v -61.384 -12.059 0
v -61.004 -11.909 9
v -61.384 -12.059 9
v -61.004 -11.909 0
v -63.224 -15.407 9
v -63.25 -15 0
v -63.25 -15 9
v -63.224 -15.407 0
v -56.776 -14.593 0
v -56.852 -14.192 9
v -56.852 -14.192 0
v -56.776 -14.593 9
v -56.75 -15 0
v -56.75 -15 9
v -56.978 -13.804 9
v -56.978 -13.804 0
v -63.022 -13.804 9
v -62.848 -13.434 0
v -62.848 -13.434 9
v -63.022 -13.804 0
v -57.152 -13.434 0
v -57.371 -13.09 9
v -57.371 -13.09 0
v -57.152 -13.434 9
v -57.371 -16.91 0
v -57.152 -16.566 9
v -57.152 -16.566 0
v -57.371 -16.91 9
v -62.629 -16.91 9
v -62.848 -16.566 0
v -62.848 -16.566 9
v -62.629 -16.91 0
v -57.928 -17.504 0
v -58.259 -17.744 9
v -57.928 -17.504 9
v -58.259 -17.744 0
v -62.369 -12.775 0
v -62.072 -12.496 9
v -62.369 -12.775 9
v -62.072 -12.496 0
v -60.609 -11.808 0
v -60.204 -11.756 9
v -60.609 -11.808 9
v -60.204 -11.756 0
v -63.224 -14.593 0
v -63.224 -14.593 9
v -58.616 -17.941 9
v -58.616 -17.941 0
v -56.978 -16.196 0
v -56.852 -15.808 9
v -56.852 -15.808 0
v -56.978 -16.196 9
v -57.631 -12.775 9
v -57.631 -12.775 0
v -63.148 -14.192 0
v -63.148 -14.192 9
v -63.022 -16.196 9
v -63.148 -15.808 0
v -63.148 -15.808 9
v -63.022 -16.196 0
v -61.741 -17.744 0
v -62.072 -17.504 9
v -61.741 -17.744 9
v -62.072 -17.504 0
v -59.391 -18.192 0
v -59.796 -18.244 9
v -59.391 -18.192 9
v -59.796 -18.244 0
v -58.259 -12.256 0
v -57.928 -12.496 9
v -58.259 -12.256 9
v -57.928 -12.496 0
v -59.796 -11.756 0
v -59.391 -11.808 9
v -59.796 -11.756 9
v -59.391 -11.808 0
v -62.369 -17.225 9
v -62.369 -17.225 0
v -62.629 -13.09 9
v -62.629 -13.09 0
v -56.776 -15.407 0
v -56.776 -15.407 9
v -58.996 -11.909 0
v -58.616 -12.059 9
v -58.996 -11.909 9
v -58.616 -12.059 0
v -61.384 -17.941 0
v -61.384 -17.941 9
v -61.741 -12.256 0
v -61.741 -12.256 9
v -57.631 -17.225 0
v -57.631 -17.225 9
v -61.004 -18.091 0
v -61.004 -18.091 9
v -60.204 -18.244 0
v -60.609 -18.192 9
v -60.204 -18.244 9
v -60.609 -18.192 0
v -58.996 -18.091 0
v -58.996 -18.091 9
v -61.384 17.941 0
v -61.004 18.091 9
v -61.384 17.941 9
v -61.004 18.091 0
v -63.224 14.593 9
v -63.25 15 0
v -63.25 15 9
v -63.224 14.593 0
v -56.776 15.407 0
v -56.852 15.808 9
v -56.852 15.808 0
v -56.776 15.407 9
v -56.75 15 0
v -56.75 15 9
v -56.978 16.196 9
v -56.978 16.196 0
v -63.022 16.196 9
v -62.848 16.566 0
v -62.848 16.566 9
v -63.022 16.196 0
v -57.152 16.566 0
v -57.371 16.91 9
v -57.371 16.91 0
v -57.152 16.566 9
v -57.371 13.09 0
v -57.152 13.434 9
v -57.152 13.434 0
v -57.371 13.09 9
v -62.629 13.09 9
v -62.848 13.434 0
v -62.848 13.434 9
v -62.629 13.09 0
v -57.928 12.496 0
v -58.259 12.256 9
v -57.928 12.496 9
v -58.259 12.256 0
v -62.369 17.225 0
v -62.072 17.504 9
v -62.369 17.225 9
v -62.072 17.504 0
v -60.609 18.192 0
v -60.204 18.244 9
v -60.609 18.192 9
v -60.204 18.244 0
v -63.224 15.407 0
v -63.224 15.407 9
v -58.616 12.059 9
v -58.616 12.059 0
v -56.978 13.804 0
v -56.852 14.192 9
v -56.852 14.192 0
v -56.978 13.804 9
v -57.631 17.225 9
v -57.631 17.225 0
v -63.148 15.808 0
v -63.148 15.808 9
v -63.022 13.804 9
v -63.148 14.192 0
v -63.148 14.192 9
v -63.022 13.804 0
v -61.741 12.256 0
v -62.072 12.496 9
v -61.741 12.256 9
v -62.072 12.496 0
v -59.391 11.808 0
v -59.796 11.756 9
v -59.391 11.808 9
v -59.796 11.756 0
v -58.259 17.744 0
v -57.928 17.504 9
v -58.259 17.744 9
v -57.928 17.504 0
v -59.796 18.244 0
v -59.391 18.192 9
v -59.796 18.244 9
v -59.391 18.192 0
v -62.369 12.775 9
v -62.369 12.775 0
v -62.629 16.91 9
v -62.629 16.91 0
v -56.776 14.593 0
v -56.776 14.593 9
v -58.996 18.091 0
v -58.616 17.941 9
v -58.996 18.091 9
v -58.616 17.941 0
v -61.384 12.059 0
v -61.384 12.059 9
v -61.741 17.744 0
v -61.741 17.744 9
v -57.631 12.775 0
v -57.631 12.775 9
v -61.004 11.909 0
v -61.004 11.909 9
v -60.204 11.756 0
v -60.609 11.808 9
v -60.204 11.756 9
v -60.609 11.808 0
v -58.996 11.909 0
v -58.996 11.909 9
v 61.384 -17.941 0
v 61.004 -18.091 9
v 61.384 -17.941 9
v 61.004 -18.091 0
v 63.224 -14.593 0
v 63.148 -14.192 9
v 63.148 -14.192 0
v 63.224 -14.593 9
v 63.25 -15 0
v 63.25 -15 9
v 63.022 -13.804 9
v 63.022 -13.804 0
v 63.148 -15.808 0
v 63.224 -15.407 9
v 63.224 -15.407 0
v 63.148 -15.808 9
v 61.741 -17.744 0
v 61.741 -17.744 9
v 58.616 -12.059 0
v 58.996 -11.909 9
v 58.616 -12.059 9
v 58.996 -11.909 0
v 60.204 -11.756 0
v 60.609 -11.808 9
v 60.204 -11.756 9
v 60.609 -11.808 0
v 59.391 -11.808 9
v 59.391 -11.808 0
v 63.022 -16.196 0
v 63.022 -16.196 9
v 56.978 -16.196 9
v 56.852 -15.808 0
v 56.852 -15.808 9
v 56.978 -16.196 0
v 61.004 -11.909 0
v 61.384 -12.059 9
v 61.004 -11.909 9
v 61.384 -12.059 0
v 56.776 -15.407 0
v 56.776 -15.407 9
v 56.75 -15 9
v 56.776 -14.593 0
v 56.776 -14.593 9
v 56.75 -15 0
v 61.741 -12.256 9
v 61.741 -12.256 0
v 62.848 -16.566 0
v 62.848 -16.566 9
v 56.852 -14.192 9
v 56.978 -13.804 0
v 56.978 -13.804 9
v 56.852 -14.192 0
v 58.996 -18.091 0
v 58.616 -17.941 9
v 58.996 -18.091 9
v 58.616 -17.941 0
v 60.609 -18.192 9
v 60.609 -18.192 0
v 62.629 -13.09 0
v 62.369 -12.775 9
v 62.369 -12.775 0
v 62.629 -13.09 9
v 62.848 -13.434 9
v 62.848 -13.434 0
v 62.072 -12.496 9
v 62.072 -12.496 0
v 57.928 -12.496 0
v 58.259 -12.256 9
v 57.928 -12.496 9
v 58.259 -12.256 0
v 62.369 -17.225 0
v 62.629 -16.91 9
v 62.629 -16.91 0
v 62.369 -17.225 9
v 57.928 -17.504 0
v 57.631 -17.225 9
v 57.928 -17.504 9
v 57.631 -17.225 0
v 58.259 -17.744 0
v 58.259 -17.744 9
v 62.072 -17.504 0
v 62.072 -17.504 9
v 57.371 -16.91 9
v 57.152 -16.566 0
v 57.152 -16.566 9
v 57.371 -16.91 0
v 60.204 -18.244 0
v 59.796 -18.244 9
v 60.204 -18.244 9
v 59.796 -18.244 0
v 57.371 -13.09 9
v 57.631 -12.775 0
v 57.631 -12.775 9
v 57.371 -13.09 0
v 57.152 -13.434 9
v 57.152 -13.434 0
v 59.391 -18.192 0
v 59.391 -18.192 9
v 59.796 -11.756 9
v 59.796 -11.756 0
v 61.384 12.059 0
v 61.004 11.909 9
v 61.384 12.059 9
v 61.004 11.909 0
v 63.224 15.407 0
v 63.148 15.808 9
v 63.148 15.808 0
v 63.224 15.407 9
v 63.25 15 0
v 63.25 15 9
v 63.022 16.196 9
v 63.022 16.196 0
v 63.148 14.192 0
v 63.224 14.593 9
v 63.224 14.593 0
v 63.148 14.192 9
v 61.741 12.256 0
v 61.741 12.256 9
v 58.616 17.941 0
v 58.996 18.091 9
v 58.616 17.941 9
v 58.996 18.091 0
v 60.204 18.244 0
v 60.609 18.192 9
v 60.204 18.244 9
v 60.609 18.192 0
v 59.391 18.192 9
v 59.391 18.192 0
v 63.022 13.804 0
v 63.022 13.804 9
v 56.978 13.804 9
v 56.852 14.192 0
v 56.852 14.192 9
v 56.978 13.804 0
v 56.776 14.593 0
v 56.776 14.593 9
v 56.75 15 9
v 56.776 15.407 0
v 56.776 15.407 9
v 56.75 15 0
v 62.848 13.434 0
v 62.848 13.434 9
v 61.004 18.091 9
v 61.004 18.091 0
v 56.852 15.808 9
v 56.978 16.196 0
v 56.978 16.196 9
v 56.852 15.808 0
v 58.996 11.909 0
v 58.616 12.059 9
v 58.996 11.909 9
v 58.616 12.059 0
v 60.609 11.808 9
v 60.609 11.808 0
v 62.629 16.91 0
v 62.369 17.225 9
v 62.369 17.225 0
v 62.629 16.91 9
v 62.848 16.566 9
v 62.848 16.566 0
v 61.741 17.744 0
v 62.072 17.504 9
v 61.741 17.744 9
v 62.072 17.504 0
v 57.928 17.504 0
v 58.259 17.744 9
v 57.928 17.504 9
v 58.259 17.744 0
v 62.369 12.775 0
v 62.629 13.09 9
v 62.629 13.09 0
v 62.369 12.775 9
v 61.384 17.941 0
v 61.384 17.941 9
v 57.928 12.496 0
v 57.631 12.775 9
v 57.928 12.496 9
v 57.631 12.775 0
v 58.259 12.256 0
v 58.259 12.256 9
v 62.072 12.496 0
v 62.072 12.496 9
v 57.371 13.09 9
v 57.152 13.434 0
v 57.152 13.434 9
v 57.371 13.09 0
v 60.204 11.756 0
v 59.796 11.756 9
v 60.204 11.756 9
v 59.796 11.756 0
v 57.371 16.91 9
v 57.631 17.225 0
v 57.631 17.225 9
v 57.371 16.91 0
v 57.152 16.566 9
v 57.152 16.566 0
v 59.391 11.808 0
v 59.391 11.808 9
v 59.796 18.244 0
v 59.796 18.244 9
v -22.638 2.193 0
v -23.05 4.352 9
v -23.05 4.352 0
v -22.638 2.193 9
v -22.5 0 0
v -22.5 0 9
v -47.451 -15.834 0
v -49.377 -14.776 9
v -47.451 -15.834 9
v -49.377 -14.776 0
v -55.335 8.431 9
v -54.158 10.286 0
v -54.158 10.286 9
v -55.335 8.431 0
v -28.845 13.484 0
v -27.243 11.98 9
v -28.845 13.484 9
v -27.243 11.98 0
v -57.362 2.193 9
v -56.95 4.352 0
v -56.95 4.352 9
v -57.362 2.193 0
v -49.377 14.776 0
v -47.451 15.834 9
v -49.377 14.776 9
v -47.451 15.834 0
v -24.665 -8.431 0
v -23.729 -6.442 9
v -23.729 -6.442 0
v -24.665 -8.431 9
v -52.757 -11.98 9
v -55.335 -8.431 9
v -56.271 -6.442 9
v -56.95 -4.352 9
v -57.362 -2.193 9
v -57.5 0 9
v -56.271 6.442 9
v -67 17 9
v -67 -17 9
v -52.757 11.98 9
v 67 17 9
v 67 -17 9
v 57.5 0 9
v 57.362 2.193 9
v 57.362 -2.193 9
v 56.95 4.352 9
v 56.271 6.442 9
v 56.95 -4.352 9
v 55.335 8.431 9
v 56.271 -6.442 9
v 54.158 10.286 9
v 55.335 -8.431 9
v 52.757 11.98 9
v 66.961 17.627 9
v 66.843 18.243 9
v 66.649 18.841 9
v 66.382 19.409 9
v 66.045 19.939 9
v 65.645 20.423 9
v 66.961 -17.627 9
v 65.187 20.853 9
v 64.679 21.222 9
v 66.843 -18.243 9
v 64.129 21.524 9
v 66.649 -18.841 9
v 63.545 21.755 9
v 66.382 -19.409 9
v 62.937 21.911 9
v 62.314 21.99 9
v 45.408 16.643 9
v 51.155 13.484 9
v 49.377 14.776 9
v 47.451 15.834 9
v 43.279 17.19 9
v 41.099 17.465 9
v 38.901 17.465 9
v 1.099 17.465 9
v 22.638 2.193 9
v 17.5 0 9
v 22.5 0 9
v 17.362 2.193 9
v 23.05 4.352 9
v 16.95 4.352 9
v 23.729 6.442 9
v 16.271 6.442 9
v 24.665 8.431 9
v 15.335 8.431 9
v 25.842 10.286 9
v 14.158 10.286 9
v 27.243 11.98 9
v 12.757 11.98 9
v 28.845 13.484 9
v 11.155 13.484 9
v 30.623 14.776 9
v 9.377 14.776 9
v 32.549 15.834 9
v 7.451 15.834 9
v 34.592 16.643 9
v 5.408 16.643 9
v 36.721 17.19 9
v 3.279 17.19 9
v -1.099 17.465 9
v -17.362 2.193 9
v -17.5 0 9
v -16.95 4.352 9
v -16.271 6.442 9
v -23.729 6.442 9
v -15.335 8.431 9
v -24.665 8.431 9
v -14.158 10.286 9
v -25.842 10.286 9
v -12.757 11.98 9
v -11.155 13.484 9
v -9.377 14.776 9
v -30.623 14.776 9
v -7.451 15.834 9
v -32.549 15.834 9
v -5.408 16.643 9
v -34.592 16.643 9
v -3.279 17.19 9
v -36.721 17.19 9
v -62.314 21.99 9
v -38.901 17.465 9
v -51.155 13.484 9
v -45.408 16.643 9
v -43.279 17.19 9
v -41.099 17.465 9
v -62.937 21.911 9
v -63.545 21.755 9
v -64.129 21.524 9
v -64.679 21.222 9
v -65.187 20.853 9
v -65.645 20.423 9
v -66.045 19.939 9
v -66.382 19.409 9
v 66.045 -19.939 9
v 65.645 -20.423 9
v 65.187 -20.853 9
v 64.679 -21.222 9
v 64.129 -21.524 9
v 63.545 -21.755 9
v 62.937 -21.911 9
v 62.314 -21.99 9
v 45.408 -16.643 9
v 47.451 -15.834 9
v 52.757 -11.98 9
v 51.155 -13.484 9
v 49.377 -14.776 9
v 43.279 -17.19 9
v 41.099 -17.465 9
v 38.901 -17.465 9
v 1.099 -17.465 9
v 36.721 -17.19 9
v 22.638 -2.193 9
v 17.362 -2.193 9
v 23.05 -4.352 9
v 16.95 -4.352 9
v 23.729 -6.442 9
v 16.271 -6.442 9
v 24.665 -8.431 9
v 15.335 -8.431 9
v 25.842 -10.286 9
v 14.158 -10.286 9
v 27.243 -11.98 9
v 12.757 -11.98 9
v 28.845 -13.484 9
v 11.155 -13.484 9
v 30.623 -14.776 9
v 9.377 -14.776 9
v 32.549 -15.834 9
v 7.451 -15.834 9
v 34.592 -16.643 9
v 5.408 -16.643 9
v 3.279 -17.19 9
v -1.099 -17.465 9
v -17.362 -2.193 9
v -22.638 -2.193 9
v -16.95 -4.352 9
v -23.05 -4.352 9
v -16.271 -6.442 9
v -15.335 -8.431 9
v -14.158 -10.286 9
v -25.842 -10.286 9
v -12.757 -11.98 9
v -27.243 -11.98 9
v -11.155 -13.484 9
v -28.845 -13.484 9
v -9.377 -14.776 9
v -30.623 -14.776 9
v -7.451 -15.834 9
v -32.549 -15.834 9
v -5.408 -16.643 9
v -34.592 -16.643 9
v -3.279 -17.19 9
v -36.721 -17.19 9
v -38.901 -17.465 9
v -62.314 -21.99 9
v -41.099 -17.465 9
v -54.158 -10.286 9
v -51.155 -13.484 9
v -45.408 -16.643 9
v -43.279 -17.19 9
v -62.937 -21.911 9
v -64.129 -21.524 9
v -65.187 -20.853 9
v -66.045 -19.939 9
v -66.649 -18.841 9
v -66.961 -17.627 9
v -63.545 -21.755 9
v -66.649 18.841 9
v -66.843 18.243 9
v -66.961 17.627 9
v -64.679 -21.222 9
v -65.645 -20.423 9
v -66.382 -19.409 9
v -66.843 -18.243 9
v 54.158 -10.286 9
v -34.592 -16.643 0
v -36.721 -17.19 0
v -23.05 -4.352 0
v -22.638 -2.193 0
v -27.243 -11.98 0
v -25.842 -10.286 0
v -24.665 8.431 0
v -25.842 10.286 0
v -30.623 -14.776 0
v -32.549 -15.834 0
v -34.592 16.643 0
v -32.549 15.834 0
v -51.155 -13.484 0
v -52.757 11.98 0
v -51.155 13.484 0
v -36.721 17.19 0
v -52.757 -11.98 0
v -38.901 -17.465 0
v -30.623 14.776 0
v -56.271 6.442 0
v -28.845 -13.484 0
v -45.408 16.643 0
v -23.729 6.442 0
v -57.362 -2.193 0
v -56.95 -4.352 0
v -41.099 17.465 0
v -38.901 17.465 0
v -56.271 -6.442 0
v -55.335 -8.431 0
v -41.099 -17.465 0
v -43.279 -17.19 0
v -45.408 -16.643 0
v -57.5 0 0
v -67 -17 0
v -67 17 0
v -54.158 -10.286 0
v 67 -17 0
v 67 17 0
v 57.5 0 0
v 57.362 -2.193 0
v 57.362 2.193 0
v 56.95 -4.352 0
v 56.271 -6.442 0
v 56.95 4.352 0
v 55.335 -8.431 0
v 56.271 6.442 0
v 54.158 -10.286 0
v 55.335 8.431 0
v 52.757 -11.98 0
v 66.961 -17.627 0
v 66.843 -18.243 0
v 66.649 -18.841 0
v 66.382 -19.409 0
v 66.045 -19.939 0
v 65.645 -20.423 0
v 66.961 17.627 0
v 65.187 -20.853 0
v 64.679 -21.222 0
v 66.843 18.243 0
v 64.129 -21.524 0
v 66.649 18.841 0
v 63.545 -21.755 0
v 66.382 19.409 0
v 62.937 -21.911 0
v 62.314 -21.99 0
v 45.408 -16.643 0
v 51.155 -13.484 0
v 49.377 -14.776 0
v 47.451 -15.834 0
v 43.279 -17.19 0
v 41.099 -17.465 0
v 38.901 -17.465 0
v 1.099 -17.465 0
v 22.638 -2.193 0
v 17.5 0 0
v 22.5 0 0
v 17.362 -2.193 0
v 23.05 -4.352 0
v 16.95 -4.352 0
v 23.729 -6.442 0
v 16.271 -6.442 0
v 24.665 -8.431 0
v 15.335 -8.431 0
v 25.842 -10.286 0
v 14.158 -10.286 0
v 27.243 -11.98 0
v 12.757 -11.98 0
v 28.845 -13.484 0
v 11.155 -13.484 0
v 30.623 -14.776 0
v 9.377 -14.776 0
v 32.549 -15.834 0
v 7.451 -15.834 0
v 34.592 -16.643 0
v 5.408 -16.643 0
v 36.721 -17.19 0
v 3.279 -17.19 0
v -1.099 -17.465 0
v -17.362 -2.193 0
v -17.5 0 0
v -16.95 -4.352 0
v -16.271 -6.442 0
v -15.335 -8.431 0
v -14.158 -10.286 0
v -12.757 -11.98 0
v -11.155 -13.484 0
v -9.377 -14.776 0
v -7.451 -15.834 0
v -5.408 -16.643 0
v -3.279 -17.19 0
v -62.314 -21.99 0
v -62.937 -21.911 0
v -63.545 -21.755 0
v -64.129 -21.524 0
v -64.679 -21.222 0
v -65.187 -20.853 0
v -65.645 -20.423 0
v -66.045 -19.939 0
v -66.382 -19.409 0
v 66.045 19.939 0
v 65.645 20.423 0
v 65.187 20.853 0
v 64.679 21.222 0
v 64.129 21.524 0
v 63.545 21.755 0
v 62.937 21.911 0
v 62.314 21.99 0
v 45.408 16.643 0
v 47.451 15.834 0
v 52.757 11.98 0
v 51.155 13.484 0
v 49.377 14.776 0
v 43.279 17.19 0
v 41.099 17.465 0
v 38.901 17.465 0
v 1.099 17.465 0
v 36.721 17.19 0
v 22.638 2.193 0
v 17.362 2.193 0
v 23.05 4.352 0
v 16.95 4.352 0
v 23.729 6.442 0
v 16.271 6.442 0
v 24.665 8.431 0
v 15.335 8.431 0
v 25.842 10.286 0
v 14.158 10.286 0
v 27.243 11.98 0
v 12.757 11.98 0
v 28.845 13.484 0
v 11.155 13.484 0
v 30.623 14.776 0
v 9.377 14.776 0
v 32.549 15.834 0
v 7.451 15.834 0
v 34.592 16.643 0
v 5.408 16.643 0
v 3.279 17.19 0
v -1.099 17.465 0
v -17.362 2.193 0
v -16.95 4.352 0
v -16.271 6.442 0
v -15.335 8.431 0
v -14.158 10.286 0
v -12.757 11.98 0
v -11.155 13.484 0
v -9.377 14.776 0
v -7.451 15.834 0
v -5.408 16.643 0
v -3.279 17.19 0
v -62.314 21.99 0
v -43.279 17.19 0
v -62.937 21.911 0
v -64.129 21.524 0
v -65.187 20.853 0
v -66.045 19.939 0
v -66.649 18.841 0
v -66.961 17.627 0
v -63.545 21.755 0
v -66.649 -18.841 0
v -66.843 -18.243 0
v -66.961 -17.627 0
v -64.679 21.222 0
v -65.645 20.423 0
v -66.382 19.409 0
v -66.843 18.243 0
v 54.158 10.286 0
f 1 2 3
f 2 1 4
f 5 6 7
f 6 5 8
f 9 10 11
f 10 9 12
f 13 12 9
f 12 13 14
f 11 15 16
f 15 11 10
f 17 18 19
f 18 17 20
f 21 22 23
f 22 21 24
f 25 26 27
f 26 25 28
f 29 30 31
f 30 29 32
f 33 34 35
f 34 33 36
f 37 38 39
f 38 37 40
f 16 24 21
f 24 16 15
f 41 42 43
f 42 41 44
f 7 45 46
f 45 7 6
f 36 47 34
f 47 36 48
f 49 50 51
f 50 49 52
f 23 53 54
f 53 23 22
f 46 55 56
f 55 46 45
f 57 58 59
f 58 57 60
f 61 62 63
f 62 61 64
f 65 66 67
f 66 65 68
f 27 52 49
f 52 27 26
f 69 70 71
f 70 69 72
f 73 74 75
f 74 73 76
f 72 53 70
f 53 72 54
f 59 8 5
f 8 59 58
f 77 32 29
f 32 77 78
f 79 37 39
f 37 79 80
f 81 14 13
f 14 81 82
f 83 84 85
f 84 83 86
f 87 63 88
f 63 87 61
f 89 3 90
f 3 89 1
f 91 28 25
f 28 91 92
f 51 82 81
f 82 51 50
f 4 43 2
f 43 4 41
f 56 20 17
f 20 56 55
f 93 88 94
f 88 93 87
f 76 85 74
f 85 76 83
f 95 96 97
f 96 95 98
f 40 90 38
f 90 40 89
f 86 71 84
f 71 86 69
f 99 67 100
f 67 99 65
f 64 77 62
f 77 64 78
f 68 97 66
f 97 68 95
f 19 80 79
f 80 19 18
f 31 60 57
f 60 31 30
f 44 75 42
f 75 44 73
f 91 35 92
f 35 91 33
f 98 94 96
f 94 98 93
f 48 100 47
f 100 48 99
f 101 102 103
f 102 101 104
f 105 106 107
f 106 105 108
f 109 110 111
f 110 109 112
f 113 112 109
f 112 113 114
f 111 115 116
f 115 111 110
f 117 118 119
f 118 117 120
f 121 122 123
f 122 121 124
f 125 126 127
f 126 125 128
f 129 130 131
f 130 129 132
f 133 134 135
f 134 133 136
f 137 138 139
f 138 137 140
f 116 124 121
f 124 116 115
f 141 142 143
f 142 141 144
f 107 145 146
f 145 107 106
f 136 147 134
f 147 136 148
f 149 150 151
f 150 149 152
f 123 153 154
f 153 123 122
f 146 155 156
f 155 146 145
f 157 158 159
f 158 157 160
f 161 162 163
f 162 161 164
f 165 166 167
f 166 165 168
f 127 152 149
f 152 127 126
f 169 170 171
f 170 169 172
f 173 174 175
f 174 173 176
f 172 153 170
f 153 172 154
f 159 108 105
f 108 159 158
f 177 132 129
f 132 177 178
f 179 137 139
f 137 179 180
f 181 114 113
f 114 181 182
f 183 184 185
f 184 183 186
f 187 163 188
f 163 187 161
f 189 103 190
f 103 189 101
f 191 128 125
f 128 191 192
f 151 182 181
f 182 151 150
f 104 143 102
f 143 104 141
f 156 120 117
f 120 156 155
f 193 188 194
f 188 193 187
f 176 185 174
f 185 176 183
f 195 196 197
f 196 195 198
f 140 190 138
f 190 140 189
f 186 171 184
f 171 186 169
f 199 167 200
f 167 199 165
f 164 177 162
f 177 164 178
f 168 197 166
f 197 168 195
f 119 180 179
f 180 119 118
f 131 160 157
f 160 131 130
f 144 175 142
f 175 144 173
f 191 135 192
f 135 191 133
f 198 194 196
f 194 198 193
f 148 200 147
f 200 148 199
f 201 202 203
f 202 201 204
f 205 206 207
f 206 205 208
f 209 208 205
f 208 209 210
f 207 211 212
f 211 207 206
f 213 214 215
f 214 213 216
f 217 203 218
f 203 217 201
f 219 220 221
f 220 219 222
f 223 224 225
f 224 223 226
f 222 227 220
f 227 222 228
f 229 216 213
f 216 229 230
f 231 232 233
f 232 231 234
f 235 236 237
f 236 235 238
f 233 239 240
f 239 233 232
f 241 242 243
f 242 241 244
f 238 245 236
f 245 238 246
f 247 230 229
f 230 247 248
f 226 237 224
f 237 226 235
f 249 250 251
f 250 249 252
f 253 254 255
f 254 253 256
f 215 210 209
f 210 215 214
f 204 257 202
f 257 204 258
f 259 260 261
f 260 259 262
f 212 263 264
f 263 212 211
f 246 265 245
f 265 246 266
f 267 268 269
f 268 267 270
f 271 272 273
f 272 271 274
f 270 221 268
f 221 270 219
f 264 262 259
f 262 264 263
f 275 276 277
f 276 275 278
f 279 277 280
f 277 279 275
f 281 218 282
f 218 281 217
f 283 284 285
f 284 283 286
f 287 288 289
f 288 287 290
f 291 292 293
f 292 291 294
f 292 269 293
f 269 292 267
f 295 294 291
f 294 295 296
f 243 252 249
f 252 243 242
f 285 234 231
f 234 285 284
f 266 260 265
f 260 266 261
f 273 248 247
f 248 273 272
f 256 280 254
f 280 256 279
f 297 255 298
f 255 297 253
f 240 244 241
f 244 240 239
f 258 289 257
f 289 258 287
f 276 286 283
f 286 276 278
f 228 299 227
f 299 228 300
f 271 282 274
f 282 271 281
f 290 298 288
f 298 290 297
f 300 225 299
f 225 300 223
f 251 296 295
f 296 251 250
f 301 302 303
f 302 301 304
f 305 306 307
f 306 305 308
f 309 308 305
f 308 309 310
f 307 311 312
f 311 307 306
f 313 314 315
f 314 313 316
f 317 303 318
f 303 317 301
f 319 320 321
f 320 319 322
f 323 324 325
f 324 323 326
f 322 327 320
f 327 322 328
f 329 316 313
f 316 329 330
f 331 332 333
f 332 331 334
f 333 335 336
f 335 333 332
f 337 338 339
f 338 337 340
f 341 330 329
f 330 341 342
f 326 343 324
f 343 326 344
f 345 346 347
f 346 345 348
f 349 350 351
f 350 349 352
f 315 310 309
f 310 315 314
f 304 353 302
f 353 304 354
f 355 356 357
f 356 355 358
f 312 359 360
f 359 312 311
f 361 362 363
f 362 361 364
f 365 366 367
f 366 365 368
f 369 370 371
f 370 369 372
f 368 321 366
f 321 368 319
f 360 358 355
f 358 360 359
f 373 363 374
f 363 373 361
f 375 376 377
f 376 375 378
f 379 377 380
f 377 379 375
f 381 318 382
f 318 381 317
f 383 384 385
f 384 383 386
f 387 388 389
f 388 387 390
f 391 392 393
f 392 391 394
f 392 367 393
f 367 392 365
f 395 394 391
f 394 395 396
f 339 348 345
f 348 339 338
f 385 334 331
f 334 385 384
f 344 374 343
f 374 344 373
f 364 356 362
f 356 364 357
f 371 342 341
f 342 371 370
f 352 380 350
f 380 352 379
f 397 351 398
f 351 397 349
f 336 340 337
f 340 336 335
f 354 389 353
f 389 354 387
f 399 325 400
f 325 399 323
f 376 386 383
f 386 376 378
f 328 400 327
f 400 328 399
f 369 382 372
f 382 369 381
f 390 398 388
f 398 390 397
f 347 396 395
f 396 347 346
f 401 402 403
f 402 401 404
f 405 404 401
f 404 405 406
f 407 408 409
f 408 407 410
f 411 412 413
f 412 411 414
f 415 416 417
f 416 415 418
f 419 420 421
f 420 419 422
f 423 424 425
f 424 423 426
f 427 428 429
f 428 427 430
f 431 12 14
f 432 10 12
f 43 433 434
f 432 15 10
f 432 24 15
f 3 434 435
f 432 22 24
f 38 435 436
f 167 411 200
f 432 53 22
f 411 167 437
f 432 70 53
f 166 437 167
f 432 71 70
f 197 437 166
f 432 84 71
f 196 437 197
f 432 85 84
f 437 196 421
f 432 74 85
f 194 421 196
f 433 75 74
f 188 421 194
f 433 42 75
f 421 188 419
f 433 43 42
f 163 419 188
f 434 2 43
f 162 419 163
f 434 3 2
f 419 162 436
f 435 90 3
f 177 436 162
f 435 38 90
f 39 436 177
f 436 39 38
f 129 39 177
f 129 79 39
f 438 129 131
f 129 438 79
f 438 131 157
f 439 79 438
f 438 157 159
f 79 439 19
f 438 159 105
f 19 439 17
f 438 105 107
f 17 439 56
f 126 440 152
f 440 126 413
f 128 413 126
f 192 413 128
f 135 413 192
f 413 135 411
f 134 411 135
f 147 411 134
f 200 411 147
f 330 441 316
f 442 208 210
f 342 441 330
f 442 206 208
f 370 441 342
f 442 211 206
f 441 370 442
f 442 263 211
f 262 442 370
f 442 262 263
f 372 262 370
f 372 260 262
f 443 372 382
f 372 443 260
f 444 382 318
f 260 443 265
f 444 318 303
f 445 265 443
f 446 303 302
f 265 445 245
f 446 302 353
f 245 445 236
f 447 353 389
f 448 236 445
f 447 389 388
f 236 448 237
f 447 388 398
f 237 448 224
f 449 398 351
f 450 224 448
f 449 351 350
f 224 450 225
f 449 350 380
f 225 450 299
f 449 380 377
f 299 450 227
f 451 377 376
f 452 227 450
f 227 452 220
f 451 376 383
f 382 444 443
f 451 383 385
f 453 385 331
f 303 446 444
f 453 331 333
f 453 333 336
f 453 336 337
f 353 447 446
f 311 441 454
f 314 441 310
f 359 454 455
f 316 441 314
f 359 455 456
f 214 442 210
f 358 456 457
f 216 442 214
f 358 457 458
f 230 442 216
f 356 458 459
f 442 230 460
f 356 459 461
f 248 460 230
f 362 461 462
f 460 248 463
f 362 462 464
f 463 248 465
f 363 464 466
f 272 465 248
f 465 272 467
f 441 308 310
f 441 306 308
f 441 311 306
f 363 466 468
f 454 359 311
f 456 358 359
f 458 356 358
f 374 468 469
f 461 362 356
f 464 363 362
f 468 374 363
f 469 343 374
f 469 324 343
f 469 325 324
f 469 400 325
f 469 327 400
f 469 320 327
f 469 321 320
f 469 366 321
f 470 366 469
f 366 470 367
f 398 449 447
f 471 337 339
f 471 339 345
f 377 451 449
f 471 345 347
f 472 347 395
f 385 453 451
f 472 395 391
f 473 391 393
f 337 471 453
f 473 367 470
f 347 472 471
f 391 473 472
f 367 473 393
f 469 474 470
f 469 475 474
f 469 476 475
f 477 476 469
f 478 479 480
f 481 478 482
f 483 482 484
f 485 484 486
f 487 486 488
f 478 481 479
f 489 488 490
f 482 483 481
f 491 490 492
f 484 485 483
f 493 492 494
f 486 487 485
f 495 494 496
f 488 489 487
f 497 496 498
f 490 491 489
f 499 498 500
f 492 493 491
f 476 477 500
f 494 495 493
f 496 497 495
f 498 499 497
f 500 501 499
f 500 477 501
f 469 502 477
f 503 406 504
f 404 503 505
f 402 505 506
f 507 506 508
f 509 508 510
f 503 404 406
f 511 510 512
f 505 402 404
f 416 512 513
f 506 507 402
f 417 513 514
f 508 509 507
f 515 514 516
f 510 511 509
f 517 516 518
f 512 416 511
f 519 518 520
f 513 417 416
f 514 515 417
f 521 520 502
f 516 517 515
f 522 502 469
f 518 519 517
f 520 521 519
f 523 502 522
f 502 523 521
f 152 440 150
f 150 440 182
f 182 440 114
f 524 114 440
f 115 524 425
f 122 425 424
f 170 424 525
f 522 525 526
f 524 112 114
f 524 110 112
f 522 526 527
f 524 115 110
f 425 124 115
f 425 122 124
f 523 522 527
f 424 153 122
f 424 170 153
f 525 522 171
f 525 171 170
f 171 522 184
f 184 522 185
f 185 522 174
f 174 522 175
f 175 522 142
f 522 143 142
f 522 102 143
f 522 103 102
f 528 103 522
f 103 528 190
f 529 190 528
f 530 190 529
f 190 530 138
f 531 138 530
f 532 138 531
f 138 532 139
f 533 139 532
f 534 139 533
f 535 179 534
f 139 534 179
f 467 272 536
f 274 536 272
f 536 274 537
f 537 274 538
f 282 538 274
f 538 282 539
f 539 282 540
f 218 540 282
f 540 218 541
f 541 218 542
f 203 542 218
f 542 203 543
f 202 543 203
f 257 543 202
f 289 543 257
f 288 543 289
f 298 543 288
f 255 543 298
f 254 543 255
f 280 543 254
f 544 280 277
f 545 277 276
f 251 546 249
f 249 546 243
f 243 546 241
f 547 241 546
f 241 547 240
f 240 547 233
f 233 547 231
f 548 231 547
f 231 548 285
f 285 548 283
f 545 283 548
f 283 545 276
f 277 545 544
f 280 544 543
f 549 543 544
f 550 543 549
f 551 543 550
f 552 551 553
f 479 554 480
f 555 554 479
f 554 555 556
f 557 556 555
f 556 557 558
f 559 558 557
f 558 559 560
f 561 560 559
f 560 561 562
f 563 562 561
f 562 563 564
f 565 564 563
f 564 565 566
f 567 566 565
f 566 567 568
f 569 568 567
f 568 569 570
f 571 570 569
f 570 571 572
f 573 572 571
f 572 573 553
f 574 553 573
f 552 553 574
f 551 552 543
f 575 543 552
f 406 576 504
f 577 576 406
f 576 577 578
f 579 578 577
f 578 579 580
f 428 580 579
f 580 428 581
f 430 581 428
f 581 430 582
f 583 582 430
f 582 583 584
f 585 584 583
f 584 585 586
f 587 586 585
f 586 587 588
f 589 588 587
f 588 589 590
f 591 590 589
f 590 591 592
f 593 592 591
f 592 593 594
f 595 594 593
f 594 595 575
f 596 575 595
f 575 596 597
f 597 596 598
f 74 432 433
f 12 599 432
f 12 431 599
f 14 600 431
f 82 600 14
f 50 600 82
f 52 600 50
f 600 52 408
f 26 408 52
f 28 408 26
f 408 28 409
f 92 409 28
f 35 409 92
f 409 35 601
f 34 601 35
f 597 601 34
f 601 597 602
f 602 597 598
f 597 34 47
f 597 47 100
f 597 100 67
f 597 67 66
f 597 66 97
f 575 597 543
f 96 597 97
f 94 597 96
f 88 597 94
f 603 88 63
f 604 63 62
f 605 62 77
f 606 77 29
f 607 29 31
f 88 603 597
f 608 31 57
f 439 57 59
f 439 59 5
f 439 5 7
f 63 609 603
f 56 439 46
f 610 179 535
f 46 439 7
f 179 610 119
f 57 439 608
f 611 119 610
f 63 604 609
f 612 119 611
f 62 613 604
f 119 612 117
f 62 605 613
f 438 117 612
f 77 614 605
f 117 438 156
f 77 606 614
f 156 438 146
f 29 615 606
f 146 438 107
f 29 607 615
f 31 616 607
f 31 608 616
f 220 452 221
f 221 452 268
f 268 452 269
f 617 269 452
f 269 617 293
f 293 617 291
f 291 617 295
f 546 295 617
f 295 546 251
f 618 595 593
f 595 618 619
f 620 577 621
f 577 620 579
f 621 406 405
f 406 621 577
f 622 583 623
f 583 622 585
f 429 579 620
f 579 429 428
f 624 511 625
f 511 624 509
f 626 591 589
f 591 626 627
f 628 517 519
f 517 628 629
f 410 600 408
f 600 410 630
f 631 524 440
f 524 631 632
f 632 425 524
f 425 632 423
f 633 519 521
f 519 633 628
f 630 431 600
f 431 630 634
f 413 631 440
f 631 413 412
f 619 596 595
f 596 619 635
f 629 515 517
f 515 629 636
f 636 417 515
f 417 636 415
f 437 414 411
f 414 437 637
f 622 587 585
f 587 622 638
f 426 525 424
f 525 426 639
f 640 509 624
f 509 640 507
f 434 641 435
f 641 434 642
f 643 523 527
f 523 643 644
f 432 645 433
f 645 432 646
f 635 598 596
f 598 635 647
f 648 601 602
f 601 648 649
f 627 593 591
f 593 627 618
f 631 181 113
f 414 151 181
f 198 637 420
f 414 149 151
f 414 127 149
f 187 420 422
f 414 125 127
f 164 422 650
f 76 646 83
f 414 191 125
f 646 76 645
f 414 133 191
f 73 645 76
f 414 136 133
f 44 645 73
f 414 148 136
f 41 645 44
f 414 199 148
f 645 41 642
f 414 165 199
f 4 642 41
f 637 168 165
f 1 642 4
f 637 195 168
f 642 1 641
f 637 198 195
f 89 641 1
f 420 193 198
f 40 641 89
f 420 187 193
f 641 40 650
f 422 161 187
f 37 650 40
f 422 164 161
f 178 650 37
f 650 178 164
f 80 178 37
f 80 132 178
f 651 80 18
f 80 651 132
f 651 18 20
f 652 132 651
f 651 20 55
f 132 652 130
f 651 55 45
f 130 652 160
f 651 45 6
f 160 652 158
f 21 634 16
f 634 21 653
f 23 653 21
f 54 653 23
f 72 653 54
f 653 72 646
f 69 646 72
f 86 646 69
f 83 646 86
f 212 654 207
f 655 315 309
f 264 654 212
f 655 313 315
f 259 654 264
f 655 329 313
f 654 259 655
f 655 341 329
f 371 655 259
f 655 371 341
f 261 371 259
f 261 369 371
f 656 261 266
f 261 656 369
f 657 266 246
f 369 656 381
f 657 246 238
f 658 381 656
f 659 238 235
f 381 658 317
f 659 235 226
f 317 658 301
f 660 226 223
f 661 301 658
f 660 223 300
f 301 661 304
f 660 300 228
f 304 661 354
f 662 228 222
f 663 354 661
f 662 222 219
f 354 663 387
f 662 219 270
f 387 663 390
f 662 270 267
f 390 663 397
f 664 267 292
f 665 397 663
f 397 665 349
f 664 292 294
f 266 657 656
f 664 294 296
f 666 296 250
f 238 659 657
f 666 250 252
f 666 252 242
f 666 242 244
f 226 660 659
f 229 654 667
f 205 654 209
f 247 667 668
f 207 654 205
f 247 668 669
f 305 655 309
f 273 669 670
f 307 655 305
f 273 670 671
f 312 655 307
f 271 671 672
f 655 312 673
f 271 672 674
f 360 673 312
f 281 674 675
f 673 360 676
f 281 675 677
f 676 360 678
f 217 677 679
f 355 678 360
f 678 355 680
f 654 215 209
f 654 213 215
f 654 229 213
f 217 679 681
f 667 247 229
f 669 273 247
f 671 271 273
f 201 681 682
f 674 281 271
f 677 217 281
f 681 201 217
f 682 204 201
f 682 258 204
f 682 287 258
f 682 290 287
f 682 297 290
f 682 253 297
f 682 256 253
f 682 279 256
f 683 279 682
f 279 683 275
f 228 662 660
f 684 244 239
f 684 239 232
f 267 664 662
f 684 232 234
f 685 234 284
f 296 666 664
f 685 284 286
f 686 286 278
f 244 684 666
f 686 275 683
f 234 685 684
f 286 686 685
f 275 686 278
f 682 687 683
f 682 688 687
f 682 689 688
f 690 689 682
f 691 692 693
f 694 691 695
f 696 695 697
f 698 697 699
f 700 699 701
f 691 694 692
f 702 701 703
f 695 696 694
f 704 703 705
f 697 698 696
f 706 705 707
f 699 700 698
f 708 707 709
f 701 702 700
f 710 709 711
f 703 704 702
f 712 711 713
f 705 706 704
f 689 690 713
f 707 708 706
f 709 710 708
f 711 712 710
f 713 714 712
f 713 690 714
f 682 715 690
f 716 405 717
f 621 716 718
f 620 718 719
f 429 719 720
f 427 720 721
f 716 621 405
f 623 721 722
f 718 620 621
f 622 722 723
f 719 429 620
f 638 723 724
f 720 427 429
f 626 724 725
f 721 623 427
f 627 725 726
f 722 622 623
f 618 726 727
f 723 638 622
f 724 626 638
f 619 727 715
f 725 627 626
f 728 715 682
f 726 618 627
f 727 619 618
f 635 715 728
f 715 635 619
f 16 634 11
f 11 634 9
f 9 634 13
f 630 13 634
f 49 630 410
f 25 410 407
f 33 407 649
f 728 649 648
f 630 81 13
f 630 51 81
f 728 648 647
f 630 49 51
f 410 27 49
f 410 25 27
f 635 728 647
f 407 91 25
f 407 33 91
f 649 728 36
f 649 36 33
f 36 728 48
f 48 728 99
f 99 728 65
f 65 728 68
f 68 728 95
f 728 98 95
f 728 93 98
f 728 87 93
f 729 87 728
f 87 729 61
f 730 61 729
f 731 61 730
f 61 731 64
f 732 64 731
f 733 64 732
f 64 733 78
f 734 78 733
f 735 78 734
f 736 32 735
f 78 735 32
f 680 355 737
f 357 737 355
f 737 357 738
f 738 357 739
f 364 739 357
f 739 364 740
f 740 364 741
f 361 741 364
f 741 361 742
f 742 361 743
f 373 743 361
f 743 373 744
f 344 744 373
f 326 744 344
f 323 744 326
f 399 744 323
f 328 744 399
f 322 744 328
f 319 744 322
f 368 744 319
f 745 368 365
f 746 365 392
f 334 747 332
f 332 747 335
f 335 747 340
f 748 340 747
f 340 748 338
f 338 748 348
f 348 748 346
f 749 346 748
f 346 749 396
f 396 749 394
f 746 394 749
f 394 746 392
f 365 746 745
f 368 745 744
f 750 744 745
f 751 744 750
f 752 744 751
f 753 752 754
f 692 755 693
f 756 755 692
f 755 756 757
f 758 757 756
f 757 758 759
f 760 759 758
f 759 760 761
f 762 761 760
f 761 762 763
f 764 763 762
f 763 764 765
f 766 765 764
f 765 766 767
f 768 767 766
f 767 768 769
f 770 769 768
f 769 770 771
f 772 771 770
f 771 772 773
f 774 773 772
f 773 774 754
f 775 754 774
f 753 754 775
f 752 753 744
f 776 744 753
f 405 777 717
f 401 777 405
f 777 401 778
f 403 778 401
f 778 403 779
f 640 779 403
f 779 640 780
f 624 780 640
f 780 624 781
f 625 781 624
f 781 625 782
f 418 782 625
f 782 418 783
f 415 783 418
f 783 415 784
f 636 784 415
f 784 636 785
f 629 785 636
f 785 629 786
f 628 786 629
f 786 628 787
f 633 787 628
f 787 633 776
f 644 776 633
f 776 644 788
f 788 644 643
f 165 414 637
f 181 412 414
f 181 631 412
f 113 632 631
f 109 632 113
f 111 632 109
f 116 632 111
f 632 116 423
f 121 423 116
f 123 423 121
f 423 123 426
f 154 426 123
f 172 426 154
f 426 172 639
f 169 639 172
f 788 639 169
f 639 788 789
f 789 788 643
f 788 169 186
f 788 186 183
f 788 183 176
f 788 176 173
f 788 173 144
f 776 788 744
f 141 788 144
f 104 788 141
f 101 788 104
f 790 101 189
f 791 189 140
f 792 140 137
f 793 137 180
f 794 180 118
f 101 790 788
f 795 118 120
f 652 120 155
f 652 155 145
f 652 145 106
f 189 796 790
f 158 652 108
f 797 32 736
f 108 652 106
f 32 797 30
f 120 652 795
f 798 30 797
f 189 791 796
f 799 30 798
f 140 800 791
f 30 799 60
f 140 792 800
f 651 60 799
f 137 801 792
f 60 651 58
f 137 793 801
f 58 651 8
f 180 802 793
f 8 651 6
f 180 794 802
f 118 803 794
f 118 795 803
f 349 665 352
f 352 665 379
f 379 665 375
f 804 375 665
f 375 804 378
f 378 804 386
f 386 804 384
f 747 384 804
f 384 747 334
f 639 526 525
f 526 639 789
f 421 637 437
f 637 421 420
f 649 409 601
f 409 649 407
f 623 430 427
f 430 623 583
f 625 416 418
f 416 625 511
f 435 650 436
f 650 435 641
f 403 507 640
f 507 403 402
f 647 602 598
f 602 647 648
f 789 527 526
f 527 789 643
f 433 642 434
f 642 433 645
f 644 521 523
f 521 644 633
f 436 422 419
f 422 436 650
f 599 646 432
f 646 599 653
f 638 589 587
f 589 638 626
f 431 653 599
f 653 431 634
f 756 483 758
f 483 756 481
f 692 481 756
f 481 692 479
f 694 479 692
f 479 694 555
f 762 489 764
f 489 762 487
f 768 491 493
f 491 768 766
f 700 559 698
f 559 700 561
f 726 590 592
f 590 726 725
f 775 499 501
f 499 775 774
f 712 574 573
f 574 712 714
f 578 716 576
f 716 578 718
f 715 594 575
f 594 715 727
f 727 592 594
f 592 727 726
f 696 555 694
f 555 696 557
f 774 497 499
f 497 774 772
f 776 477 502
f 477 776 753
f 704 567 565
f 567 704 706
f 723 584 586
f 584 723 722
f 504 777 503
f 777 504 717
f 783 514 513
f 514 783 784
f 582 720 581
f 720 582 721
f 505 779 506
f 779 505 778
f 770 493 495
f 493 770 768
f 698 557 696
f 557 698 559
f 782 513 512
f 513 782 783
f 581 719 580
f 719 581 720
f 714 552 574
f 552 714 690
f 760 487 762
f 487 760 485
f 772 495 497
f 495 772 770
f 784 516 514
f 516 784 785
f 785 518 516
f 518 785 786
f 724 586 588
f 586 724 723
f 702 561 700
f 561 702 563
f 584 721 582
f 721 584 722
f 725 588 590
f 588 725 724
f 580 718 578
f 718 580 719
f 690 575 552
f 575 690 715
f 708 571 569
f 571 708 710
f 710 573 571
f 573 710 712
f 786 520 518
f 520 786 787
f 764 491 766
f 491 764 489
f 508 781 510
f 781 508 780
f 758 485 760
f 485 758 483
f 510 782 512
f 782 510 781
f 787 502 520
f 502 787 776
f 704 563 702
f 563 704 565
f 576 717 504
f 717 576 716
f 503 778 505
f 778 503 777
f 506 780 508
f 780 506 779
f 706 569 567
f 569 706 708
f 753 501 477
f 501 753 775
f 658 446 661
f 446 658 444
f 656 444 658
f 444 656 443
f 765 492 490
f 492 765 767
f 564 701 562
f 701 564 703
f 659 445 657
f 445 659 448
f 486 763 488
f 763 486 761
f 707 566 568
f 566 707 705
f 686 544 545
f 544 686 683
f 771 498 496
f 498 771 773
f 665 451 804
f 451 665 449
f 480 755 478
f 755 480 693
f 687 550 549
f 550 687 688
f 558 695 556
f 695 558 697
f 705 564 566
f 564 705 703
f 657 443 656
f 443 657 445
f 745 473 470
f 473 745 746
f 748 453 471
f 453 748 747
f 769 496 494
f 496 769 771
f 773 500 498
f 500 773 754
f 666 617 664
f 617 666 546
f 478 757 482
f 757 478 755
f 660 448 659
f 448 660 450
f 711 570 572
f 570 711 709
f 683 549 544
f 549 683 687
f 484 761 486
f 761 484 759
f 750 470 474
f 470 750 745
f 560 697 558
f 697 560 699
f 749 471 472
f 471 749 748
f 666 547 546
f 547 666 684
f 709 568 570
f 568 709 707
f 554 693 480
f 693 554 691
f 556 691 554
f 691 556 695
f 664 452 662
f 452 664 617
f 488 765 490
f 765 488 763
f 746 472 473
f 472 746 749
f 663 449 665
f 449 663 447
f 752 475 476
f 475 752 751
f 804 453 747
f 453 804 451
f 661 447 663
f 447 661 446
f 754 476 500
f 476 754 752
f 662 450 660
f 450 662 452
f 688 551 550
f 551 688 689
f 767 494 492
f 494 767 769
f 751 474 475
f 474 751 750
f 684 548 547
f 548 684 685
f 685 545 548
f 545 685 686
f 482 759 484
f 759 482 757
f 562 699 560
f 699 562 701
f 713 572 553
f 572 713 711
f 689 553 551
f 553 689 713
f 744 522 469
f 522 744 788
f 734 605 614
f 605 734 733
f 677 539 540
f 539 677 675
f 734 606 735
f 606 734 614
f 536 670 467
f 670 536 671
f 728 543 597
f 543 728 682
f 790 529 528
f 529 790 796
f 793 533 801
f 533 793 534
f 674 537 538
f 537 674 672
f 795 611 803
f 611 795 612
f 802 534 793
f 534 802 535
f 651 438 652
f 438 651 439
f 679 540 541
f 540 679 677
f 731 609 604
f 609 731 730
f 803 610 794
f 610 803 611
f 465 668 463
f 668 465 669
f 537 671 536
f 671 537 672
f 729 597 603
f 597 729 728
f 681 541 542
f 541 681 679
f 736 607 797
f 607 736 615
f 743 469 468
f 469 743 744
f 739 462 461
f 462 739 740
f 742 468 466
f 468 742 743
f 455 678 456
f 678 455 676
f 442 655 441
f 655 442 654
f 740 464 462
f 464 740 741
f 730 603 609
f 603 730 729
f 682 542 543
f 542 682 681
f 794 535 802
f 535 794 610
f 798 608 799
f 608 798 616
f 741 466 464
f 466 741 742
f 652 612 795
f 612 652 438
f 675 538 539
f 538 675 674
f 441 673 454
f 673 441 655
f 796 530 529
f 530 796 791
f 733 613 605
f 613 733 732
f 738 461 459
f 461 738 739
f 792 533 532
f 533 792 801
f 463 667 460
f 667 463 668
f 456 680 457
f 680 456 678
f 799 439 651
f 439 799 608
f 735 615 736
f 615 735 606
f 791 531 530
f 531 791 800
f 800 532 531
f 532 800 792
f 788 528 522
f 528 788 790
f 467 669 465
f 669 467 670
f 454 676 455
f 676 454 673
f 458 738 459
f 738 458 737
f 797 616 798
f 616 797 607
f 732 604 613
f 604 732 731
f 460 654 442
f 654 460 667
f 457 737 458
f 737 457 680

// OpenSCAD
$fn = 50;

difference() {
	union() {
		hull() {
			translate(v = [-62.0, 17.0, 0]) {
				cylinder(h = 9, r = 5);
			}
			translate(v = [62.0, 17.0, 0]) {
				cylinder(h = 9, r = 5);
			}
			translate(v = [-62.0, -17.0, 0]) {
				cylinder(h = 9, r = 5);
			}
			translate(v = [62.0, -17.0, 0]) {
				cylinder(h = 9, r = 5);
			}
		}
	}
	union() {
		translate(v = [-60.0, -15.0, -100.0]) {
			cylinder(h = 200, r = 3.25);
		}
		translate(v = [-60.0, 15.0, -100.0]) {
			cylinder(h = 200, r = 3.25);
		}
		translate(v = [60.0, -15.0, -100.0]) {
			cylinder(h = 200, r = 3.25);
		}
		translate(v = [60.0, 15.0, -100.0]) {
			cylinder(h = 200, r = 3.25);
		}
		translate(v = [-60.0, -15.0, -100.0]) {
			cylinder(h = 200, r = 1.8);
		}
		translate(v = [-60.0, 15.0, -100.0]) {
			cylinder(h = 200, r = 1.8);
		}
		translate(v = [60.0, -15.0, -100.0]) {
			cylinder(h = 200, r = 1.8);
		}
		translate(v = [60.0, 15.0, -100.0]) {
			cylinder(h = 200, r = 1.8);
		}
		translate(v = [-40.0, 0, 0.0]) {
			cylinder(h = 9, r = 17.5);
		}
		cylinder(h = 9, r = 17.5);
		translate(v = [40.0, 0, 0.0]) {
			cylinder(h = 9, r = 17.5);
		}
	}
}
